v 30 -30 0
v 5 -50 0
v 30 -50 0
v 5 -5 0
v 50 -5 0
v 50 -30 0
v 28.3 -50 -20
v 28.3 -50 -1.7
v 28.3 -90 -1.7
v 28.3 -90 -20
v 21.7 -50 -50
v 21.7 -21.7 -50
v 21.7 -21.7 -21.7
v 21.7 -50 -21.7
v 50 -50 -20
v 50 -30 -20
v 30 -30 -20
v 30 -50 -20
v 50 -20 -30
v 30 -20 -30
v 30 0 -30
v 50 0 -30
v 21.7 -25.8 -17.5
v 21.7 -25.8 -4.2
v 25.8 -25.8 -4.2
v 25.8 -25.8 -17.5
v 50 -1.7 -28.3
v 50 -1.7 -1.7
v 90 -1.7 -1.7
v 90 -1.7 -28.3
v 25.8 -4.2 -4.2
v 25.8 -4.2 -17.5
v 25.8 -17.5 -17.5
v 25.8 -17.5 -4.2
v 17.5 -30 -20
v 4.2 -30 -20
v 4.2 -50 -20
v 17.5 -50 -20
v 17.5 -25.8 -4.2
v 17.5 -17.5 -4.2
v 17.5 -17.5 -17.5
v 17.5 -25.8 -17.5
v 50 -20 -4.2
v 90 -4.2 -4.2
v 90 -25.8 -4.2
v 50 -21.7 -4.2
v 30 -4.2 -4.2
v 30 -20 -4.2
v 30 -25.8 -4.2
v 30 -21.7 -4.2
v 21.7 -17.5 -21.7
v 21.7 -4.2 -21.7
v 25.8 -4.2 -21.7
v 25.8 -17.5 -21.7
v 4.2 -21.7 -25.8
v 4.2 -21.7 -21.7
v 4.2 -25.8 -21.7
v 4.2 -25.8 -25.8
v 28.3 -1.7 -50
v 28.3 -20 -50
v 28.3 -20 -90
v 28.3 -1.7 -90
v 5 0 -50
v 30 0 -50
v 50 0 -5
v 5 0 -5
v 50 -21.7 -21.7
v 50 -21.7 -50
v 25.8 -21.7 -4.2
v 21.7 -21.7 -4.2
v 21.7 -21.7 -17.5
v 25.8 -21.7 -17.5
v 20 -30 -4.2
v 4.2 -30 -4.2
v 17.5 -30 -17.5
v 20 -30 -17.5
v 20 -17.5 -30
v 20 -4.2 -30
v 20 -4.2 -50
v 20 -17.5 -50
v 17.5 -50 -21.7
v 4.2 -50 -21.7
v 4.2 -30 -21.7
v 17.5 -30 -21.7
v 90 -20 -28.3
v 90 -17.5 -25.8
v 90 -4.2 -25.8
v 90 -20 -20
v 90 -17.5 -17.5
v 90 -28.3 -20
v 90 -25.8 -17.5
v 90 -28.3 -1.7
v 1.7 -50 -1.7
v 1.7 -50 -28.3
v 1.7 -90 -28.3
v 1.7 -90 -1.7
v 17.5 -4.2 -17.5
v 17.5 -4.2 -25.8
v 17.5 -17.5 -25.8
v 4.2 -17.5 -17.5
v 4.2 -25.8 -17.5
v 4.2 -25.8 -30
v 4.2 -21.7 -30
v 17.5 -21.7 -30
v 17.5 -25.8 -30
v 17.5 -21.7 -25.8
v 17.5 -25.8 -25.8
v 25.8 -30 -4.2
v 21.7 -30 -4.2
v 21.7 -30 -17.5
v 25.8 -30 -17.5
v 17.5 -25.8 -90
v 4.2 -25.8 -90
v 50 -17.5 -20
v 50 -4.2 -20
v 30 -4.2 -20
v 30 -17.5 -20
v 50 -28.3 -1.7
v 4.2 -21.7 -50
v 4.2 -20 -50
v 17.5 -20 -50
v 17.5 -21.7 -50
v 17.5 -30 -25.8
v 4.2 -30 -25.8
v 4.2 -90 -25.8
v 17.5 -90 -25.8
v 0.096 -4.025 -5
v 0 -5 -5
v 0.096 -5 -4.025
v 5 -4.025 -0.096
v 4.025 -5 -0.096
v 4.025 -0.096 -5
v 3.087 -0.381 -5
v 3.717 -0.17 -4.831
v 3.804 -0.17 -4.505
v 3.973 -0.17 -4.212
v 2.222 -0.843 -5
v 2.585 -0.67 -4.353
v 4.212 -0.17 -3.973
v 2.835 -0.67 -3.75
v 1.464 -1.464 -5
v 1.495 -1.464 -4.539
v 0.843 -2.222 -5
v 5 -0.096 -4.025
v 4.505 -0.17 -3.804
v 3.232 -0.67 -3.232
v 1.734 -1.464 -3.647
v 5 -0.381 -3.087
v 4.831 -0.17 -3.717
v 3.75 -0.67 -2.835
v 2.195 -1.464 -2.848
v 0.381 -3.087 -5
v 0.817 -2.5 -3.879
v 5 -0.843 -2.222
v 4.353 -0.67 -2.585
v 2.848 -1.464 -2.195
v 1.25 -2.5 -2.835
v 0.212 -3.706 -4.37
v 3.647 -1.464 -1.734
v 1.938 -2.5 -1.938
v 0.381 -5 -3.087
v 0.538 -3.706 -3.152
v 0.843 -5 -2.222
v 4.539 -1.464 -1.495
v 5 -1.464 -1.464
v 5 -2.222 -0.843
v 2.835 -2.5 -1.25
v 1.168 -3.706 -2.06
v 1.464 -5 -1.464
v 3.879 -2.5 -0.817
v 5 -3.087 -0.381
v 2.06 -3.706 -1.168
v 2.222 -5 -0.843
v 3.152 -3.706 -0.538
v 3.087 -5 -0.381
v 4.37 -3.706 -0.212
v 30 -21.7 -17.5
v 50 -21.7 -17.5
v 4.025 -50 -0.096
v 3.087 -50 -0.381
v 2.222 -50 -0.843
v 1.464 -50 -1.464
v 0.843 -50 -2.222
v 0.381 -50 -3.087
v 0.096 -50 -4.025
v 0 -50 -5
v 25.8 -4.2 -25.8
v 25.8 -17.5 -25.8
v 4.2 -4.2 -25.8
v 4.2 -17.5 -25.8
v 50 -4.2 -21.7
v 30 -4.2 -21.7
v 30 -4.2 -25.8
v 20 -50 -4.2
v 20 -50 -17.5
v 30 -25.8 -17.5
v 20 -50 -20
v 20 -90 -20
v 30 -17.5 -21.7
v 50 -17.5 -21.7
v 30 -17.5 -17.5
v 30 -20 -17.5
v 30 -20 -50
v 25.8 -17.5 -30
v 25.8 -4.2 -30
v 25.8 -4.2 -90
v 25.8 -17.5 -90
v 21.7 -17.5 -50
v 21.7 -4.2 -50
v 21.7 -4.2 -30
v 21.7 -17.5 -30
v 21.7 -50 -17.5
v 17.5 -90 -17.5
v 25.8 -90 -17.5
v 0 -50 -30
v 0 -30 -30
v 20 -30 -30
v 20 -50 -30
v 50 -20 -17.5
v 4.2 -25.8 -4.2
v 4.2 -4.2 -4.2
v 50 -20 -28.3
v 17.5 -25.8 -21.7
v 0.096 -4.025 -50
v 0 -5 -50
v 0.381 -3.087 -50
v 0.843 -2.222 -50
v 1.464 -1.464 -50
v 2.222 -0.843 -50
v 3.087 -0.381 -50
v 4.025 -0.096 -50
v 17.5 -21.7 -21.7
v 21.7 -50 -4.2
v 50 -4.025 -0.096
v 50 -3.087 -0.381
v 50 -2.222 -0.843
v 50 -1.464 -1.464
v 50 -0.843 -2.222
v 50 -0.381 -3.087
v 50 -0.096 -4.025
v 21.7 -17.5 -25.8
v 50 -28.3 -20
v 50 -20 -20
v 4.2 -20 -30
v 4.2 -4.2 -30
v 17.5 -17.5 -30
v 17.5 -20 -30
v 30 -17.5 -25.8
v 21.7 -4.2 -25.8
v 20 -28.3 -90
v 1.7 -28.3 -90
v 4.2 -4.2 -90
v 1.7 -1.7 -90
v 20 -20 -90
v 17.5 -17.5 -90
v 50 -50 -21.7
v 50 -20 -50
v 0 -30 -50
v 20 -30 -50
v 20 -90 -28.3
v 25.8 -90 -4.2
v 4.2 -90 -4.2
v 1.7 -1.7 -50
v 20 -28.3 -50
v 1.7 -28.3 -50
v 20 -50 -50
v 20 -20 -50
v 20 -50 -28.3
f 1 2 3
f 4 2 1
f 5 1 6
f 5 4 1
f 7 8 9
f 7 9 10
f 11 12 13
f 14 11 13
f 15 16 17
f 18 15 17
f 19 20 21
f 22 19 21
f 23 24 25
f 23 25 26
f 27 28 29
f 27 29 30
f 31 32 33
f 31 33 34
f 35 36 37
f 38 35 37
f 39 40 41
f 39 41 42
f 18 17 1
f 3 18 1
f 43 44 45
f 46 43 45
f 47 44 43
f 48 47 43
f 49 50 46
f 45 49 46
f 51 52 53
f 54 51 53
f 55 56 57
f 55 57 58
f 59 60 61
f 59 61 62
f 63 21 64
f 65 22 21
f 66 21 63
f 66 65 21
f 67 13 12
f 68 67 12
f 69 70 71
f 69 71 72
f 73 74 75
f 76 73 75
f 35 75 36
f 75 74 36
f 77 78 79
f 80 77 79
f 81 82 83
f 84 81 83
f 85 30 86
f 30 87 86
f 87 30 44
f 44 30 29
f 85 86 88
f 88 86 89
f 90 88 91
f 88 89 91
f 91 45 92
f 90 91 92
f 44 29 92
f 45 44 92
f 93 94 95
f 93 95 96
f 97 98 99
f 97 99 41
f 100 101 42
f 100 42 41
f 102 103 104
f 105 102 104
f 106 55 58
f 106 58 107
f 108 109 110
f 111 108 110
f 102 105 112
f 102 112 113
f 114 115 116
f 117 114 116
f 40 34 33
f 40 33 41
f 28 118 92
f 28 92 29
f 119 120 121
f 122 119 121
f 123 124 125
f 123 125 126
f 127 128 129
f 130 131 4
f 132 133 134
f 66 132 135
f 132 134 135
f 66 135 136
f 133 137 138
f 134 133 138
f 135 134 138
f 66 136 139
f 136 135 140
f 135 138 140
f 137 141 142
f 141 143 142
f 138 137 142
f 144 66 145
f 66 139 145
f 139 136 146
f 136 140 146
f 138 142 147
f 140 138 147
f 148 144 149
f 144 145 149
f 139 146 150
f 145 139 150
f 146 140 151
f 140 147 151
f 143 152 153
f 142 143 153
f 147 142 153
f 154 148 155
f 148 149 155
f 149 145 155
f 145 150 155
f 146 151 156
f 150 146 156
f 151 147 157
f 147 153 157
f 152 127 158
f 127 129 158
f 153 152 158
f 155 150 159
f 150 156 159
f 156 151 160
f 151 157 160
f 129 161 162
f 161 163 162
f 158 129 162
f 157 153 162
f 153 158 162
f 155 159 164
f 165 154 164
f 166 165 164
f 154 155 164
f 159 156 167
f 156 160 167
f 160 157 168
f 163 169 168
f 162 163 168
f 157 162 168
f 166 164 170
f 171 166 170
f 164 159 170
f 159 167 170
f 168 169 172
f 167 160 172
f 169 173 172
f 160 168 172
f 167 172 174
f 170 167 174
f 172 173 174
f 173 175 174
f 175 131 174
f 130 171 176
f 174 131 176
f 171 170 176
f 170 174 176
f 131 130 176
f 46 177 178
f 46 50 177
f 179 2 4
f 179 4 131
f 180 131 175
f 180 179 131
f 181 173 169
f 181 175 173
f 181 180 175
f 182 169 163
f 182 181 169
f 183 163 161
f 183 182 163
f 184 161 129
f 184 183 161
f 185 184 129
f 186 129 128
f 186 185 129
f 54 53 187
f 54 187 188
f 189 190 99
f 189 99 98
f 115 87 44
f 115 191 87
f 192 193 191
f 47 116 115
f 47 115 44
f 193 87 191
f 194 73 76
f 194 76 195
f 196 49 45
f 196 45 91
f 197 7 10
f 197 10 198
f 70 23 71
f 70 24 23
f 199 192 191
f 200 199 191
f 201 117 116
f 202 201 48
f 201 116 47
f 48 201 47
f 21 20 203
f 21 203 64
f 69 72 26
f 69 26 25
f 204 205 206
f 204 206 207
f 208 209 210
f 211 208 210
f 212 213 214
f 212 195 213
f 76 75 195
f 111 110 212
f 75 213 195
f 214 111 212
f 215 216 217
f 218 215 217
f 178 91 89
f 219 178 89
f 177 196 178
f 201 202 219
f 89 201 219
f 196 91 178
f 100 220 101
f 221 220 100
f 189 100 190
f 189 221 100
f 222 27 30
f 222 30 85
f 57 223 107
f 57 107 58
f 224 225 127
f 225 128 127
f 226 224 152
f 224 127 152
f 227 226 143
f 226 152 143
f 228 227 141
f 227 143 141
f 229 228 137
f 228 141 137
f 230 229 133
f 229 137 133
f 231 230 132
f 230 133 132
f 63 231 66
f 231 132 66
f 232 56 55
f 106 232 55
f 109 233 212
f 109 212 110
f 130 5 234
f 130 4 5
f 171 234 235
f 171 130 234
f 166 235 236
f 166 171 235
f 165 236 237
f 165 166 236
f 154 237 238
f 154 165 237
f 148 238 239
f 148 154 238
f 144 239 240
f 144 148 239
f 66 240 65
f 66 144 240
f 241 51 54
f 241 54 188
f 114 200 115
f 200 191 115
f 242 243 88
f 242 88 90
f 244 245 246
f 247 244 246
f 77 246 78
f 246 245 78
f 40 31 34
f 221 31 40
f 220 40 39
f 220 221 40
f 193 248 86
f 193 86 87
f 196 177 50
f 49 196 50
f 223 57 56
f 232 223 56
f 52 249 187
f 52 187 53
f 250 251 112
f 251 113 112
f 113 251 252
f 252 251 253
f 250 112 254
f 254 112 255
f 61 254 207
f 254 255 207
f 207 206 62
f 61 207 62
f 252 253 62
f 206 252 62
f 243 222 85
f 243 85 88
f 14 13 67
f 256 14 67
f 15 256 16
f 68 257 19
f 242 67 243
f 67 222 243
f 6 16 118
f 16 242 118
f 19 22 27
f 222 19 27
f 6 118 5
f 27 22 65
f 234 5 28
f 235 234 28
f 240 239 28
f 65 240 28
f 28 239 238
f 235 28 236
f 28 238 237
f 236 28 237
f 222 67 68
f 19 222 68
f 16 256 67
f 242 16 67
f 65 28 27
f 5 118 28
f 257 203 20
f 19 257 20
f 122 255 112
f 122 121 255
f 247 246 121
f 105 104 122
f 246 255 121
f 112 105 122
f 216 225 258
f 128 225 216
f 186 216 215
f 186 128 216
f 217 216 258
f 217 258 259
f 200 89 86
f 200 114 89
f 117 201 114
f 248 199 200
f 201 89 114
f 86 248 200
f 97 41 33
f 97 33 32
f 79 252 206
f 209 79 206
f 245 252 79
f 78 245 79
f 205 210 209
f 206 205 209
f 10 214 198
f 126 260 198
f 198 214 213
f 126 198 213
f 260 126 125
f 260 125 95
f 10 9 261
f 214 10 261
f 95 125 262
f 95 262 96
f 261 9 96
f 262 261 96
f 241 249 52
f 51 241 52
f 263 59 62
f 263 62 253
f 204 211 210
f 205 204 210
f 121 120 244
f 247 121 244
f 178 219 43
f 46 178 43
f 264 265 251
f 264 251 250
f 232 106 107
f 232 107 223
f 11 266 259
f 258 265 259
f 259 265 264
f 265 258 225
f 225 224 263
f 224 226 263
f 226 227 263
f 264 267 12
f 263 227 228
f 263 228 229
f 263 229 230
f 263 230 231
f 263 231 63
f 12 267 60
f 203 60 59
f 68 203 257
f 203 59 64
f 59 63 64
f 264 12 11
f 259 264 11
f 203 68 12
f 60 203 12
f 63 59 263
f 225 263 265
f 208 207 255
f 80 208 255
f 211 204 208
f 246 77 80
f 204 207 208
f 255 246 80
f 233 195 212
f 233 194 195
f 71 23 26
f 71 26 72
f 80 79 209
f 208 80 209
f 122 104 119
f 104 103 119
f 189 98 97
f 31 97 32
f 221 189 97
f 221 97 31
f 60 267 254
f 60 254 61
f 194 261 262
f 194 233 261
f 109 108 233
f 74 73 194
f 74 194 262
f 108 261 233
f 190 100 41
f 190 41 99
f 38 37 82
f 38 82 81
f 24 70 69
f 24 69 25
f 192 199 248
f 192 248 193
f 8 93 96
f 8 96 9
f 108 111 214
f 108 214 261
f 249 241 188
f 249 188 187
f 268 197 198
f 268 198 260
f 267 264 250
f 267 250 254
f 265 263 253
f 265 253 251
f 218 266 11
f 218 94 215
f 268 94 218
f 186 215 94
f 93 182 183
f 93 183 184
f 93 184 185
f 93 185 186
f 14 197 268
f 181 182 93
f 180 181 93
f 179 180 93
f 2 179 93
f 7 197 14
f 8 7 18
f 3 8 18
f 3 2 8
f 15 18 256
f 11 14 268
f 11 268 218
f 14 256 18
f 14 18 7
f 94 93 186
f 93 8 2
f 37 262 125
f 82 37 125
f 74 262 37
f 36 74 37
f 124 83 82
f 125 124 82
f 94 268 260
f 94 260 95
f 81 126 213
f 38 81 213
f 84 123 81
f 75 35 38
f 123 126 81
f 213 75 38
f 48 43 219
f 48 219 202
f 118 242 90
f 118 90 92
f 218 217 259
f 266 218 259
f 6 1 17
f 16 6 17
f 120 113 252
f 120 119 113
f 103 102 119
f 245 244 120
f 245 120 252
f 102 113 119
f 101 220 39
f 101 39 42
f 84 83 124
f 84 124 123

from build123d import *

# Parameters (mm, degrees)
F1_DEPTH  = 50
F3_DEPTH  = 50
F5_DEPTH  = 50
F7_DEPTH  = 90
F9_DEPTH  = 90
F11_DEPTH = 90
F12_R     = 5


with BuildPart() as f1:
    # F0 (on Front) → F1 (new body)
    with BuildSketch(Plane.XZ):
        Polygon((30, 0), (0, 0), (0, -30), (20, -30), (20, -50), (21.7, -50), (21.7, -21.7), (50, -21.7), (50, -20), (30, -20), align=None)
        Polygon((28.3, -20), (20, -20), (20, -28.3), (1.7, -28.3), (1.7, -1.7), (28.3, -1.7), align=None, mode=Mode.SUBTRACT)
    extrude(amount=F1_DEPTH)

    # F2 (on Right) → F3 (join)
    with BuildSketch(Plane.YZ):
        Polygon((0, -30), (0, 0), (-30, 0), (-30, -20), (-50, -20), (-50, -21.7), (-21.7, -21.7), (-21.7, -50), (-20, -50), (-20, -30), align=None)
        Polygon((-28.3, -1.7), (-1.7, -1.7), (-1.7, -28.3), (-20, -28.3), (-20, -20), (-28.3, -20), align=None, mode=Mode.SUBTRACT)
    extrude(amount=F3_DEPTH)

    # F4 (on face) → F5 (join)
    with BuildSketch(Plane.XY):
        Polygon((30, 0), (0, 0), (0, -30), (20, -30), (20, -50), (21.7, -50), (21.7, -21.7), (50, -21.7), (50, -20), (30, -20), align=None)
        Polygon((28.3, -20), (20, -20), (20, -28.3), (1.7, -28.3), (1.7, -1.7), (28.3, -1.7), align=None, mode=Mode.SUBTRACT)
    extrude(amount=-F5_DEPTH)

    # F6 (on face) → F7 (join)
    with BuildSketch(Plane(origin=(0, 0, 0), x_dir=(0, -1, 0), z_dir=(-1, 0, 0))):
        Polygon((20, -1.7), (1.7, -1.7), (1.7, -20), (1.7, -21.7), (1.7, -28.3), (20, -28.3), (20, -21.7), (20, -20), (21.7, -20), (28.3, -20), (28.3, -1.7), (21.7, -1.7), align=None)
        Polygon((4.2, -20), (4.2, -4.2), (20, -4.2), (21.7, -4.2), (25.8, -4.2), (25.8, -17.5), (21.7, -17.5), (17.5, -17.5), (17.5, -21.7), (17.5, -25.8), (4.2, -25.8), (4.2, -21.7), align=None, mode=Mode.SUBTRACT)
    extrude(amount=-F7_DEPTH)

    # F8 (on face) → F9 (join)
    with BuildSketch(Plane(origin=(0, 0, 0), x_dir=(-1, 0, 0), z_dir=(0, 1, 0))):
        Polygon((-1.7, -20), (-1.7, -1.7), (-20, -1.7), (-21.7, -1.7), (-28.3, -1.7), (-28.3, -20), (-21.7, -20), (-20, -20), (-20, -21.7), (-20, -28.3), (-1.7, -28.3), (-1.7, -21.7), align=None)
        Polygon((-20, -4.2), (-4.2, -4.2), (-4.2, -20), (-4.2, -21.7), (-4.2, -25.8), (-17.5, -25.8), (-17.5, -21.7), (-17.5, -17.5), (-21.7, -17.5), (-25.8, -17.5), (-25.8, -4.2), (-21.7, -4.2), align=None, mode=Mode.SUBTRACT)
    extrude(amount=-F9_DEPTH)

    # F10 (on face) → F11 (join)
    with BuildSketch(Plane.XY):
        Polygon((20, -1.7), (1.7, -1.7), (1.7, -20), (1.7, -21.7), (1.7, -28.3), (20, -28.3), (20, -21.7), (20, -20), (21.7, -20), (28.3, -20), (28.3, -1.7), (21.7, -1.7), align=None)
        Polygon((4.2, -25.8), (4.2, -21.7), (4.2, -20), (4.2, -4.2), (20, -4.2), (21.7, -4.2), (25.8, -4.2), (25.8, -17.5), (21.7, -17.5), (17.5, -17.5), (17.5, -21.7), (17.5, -25.8), align=None, mode=Mode.SUBTRACT)
    extrude(amount=-F11_DEPTH)

    # F12
    f12_edges = [f1.edges().sort_by_distance(p)[0] for p in [
        (0, -25, 0),
        (0, 0, -25),
        (25, 0, 0),
    ]]
    fillet(f12_edges, radius=F12_R)


solid = f1.part
